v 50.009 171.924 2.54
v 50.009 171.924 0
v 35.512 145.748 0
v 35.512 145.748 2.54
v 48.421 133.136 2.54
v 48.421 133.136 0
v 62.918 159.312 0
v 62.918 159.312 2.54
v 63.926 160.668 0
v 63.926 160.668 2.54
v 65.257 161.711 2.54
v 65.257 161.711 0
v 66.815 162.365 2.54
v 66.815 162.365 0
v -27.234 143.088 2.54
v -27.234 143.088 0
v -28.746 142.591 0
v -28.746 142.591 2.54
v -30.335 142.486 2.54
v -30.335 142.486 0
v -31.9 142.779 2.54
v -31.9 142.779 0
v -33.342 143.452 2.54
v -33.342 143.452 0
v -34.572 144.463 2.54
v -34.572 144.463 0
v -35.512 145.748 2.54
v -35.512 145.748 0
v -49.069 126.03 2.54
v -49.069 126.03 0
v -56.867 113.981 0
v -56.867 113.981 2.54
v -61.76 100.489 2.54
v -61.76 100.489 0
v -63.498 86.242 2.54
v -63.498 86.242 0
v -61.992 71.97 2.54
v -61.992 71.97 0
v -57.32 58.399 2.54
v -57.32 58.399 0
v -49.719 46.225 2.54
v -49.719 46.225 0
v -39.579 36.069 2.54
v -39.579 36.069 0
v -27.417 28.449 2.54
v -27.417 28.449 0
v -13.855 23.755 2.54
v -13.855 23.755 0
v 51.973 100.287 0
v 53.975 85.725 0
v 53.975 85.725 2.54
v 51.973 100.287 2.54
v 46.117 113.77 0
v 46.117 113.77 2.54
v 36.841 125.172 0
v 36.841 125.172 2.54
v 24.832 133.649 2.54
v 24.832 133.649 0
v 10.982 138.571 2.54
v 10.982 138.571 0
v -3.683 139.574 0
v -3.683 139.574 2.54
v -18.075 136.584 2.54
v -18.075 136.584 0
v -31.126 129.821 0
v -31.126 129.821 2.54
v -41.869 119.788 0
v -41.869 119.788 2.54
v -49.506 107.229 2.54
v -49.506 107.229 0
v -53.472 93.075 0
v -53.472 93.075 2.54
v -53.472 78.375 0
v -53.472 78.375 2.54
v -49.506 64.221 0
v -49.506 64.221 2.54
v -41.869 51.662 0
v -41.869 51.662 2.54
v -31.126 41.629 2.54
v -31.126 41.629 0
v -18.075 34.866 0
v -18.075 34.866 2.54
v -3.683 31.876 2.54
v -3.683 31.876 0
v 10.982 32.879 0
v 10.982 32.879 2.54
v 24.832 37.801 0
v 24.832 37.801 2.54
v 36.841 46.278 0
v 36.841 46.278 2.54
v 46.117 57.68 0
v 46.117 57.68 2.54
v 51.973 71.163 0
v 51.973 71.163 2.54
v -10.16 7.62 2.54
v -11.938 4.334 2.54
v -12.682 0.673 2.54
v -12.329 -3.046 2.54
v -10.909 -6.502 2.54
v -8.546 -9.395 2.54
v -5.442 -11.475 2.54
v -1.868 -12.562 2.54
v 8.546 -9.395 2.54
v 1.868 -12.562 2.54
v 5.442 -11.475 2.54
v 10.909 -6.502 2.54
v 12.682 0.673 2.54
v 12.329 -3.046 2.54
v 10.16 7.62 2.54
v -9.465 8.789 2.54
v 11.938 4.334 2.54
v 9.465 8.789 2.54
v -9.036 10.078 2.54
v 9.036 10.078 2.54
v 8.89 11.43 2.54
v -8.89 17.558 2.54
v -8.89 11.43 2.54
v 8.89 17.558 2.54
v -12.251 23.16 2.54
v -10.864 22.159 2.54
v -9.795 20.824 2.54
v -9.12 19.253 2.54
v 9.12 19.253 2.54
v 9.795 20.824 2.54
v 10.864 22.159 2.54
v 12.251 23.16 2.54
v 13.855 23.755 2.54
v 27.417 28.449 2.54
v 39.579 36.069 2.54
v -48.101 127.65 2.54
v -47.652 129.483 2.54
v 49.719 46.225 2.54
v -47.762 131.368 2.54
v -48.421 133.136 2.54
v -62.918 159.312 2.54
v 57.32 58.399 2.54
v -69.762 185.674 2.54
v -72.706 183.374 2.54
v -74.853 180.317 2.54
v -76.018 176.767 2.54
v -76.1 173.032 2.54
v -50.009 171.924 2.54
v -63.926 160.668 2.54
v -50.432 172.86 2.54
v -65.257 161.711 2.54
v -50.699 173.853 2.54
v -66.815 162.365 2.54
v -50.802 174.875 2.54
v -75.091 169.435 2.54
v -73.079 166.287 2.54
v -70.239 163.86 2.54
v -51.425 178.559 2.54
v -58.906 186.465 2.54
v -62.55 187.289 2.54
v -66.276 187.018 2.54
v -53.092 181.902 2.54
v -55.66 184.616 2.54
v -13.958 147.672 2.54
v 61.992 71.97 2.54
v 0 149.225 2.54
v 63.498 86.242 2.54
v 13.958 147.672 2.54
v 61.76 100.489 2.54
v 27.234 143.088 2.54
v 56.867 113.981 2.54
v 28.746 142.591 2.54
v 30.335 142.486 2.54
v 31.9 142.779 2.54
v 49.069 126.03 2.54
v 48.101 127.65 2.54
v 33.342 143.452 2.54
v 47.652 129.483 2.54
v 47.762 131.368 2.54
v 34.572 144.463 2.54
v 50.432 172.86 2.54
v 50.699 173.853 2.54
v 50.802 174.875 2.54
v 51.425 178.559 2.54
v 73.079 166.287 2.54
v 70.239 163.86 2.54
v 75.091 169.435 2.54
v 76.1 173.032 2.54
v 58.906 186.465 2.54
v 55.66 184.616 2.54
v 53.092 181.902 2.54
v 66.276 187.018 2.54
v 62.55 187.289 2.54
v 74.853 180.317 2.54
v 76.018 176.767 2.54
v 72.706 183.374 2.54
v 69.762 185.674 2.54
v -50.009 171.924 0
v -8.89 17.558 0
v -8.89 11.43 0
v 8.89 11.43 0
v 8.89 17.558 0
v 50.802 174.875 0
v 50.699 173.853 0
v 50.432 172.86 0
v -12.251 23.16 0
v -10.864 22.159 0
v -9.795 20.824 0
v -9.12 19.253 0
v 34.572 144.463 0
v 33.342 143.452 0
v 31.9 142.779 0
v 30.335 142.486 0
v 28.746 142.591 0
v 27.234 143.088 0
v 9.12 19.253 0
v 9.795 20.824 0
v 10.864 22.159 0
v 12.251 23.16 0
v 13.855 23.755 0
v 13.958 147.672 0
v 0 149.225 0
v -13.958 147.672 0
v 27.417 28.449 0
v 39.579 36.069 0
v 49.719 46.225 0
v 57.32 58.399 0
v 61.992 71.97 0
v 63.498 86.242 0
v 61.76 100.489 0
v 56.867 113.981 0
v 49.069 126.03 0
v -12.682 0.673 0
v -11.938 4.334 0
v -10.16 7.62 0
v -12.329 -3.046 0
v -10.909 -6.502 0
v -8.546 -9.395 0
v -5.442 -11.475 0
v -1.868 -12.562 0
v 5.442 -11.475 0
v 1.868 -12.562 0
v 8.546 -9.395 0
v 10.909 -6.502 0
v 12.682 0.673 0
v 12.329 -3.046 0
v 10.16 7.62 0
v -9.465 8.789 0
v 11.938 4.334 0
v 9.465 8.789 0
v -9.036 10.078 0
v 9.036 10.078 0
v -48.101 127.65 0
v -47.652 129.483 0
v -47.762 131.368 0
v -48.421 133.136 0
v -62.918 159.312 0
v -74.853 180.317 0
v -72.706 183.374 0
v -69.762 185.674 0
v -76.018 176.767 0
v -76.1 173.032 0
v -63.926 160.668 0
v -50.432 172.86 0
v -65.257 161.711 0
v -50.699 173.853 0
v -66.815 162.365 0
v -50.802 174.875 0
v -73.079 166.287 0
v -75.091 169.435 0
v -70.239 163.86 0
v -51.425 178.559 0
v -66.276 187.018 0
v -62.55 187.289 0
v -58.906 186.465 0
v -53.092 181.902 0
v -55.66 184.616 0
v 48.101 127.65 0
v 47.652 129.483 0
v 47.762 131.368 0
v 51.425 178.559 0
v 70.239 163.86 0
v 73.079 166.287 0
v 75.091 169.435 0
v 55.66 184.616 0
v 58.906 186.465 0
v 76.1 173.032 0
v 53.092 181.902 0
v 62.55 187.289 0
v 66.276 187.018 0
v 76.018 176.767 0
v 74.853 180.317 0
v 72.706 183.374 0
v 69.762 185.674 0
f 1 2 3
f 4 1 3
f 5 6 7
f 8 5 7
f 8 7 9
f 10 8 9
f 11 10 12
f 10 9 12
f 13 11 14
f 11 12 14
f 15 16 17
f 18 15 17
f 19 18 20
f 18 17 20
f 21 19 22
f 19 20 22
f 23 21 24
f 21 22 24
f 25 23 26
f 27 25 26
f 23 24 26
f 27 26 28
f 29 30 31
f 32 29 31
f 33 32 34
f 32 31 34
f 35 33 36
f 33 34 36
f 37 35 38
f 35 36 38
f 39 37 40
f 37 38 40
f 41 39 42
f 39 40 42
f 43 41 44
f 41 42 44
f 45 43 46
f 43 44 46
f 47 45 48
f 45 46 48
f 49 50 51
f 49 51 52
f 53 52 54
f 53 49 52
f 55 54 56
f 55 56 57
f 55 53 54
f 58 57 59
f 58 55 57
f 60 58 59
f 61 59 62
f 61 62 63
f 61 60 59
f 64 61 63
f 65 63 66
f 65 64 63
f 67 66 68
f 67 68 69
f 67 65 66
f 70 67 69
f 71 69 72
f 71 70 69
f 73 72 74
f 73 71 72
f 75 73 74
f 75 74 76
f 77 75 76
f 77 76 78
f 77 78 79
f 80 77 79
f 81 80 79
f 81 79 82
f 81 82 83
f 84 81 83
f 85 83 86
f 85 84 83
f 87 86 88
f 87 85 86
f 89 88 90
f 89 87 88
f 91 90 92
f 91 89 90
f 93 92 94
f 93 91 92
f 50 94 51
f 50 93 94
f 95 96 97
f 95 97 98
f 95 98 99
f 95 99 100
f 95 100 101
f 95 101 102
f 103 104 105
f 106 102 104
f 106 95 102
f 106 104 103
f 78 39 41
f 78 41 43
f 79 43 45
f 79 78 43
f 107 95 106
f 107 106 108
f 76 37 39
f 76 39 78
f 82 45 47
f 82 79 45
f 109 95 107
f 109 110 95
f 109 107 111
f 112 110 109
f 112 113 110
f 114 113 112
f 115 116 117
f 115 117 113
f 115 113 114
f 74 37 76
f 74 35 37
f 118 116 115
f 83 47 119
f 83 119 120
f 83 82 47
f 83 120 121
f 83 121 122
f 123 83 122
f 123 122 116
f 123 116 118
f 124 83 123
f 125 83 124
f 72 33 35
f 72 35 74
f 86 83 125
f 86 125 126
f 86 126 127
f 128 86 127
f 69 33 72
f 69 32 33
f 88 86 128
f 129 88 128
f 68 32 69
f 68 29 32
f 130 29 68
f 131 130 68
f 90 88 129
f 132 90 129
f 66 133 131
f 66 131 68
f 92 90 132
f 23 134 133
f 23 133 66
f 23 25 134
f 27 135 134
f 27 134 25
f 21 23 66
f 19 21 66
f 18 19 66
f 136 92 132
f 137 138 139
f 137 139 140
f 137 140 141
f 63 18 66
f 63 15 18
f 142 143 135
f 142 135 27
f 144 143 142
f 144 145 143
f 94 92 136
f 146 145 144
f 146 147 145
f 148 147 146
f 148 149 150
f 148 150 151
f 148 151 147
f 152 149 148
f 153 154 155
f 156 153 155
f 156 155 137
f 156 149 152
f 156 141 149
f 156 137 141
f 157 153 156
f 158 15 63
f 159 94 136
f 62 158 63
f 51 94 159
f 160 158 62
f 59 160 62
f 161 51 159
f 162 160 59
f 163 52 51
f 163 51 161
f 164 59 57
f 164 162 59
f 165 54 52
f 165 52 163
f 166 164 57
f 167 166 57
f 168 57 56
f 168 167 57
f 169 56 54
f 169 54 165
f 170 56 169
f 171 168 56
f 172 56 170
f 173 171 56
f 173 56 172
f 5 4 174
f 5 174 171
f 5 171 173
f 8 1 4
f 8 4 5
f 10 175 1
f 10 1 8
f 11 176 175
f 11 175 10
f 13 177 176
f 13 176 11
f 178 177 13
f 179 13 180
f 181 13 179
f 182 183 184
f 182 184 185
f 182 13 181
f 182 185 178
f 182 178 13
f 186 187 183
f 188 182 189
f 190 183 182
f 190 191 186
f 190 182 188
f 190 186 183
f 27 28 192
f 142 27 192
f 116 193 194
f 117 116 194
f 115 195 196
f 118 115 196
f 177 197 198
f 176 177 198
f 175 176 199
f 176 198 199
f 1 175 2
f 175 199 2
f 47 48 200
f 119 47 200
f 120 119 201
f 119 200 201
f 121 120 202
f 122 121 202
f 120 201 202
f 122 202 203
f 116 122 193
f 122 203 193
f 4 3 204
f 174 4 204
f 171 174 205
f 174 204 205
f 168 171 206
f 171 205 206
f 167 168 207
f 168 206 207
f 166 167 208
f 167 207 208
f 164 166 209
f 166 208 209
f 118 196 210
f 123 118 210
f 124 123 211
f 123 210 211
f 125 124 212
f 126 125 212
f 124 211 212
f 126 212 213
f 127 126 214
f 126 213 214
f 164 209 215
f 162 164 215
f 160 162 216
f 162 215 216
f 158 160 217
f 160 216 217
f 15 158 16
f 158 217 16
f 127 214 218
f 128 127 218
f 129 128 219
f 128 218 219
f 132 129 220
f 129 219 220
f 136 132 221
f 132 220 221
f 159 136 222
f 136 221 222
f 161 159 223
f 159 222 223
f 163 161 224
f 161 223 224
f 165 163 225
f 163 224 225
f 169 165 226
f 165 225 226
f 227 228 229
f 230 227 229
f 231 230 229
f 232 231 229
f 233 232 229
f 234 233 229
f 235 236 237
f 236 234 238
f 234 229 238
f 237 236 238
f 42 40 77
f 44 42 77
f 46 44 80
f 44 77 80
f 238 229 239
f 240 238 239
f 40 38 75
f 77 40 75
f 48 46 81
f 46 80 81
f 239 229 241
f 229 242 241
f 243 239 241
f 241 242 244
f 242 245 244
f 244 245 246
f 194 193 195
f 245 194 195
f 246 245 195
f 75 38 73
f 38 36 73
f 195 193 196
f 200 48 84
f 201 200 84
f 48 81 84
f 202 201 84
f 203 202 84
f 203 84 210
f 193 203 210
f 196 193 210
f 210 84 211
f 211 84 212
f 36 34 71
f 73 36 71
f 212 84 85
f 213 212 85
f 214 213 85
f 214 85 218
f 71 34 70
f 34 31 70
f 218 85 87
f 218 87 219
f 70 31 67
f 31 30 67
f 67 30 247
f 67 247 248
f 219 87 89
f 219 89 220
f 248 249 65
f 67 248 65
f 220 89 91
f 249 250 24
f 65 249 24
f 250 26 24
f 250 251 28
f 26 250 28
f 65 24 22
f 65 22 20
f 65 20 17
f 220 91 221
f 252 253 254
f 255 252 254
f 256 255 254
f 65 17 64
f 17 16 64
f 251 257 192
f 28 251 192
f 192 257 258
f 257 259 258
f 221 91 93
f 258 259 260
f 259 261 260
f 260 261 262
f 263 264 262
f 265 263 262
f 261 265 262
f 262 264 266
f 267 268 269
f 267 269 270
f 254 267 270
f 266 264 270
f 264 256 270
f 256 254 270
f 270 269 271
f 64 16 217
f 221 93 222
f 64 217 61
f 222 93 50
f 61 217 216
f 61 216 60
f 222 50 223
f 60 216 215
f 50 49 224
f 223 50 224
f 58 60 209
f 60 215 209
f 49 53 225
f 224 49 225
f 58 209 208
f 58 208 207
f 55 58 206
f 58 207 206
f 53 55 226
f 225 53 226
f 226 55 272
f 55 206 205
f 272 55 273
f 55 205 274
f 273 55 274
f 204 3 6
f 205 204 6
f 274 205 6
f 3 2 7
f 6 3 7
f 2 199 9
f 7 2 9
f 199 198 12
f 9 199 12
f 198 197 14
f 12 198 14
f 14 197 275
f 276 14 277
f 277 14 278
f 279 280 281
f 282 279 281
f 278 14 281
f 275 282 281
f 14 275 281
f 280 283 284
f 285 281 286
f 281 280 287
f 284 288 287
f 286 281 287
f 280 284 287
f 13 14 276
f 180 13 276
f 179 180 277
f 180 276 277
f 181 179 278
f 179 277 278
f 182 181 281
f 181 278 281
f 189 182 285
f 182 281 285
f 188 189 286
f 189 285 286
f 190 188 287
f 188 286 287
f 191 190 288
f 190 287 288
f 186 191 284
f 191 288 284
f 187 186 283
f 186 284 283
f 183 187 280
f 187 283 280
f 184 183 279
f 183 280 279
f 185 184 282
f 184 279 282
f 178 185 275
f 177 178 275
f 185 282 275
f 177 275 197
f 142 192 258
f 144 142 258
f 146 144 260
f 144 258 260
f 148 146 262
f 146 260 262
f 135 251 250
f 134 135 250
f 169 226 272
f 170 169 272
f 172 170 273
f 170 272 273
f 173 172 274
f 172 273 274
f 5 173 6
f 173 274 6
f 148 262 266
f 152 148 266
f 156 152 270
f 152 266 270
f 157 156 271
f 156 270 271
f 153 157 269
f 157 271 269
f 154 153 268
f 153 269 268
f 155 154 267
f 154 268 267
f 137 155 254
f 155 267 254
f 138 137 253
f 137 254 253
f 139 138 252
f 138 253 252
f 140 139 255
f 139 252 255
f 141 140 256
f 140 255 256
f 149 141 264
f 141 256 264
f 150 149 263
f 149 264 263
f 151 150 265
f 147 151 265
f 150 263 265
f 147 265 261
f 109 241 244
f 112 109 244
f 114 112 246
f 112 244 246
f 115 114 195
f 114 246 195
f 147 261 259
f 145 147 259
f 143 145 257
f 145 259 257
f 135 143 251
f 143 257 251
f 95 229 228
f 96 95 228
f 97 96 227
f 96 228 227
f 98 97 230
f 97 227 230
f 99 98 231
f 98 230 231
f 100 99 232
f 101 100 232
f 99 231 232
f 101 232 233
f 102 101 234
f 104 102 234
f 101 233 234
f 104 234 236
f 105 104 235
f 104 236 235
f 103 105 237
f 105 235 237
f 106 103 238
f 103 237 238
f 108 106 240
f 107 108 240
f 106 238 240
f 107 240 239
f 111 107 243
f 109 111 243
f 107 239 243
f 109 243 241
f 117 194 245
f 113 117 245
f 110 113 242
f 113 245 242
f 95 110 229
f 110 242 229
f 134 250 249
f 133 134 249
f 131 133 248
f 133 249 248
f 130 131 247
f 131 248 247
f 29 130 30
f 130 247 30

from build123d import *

# Parameters (mm, degrees)
SKETCH1_R          = 53.975
BASE_EXTRUDE_DEPTH = 2.54


with BuildPart() as part:
    # Sketch1 → Base-Extrude (new body)
    with BuildSketch(Plane.XY):
        with BuildLine():
            Line((50.008687045, 171.923839684), (35.512218796, 145.748360325))
            ThreePointArc((35.512218796, 145.748360325), (31.899714725, 142.779219777), (27.233844451, 143.088470227))
            ThreePointArc((27.233844451, 143.088470227), (0, 149.225), (-27.233844451, 143.088470227))
            ThreePointArc((-27.233844451, 143.088470227), (-31.899714725, 142.779219777), (-35.512218796, 145.748360325))
            Line((-35.512218796, 145.748360325), (-50.008687045, 171.923839684))
            ThreePointArc((-50.008687045, 171.923839684), (-50.585784013, 173.351051132), (-50.802464763, 174.875197739))
            ThreePointArc((-50.802464763, 174.875197739), (-71.318679333, 184.632909546), (-66.815120037, 162.365310806))
            ThreePointArc((-66.815120037, 162.365310806), (-64.556557847, 161.234114711), (-62.917690155, 159.311923133))
            Line((-62.917690155, 159.311923133), (-48.421221906, 133.136443774))
            ThreePointArc((-48.421221906, 133.136443774), (-47.652448943, 129.483338569), (-49.069283461, 126.0295335))
            ThreePointArc((-49.069283461, 126.0295335), (-60.040658228, 65.052086332), (-13.854545455, 23.754833224))
            ThreePointArc((-13.854545455, 23.754833224), (-10.284188444, 21.528009466), (-8.89, 17.557816546))
            Line((-8.89, 17.557816546), (-8.89, 11.43))
            ThreePointArc((-8.89, 11.43), (-9.215861057, 9.421953686), (-10.16, 7.62))
            ThreePointArc((-10.16, 7.62), (0, -12.7), (10.16, 7.62))
            ThreePointArc((10.16, 7.62), (9.215861057, 9.421953686), (8.89, 11.43))
            Line((8.89, 11.43), (8.89, 17.557816546))
            ThreePointArc((8.89, 17.557816546), (10.284188444, 21.528009466), (13.854545455, 23.754833224))
            ThreePointArc((13.854545455, 23.754833224), (60.040658228, 65.052086332), (49.069283461, 126.0295335))
            ThreePointArc((49.069283461, 126.0295335), (47.652448943, 129.483338569), (48.421221906, 133.136443774))
            Line((48.421221906, 133.136443774), (62.917690155, 159.311923133))
            ThreePointArc((62.917690155, 159.311923133), (64.556557847, 161.234114711), (66.815120037, 162.365310806))
            ThreePointArc((66.815120037, 162.365310806), (71.318679333, 184.632909546), (50.802464763, 174.875197739))
            ThreePointArc((50.802464763, 174.875197739), (50.585784013, 173.351051132), (50.008687045, 171.923839684))
        make_face()
        with Locations((0, 85.725)):
            Circle(SKETCH1_R, mode=Mode.SUBTRACT)
    extrude(amount=BASE_EXTRUDE_DEPTH)


solid = part.part
